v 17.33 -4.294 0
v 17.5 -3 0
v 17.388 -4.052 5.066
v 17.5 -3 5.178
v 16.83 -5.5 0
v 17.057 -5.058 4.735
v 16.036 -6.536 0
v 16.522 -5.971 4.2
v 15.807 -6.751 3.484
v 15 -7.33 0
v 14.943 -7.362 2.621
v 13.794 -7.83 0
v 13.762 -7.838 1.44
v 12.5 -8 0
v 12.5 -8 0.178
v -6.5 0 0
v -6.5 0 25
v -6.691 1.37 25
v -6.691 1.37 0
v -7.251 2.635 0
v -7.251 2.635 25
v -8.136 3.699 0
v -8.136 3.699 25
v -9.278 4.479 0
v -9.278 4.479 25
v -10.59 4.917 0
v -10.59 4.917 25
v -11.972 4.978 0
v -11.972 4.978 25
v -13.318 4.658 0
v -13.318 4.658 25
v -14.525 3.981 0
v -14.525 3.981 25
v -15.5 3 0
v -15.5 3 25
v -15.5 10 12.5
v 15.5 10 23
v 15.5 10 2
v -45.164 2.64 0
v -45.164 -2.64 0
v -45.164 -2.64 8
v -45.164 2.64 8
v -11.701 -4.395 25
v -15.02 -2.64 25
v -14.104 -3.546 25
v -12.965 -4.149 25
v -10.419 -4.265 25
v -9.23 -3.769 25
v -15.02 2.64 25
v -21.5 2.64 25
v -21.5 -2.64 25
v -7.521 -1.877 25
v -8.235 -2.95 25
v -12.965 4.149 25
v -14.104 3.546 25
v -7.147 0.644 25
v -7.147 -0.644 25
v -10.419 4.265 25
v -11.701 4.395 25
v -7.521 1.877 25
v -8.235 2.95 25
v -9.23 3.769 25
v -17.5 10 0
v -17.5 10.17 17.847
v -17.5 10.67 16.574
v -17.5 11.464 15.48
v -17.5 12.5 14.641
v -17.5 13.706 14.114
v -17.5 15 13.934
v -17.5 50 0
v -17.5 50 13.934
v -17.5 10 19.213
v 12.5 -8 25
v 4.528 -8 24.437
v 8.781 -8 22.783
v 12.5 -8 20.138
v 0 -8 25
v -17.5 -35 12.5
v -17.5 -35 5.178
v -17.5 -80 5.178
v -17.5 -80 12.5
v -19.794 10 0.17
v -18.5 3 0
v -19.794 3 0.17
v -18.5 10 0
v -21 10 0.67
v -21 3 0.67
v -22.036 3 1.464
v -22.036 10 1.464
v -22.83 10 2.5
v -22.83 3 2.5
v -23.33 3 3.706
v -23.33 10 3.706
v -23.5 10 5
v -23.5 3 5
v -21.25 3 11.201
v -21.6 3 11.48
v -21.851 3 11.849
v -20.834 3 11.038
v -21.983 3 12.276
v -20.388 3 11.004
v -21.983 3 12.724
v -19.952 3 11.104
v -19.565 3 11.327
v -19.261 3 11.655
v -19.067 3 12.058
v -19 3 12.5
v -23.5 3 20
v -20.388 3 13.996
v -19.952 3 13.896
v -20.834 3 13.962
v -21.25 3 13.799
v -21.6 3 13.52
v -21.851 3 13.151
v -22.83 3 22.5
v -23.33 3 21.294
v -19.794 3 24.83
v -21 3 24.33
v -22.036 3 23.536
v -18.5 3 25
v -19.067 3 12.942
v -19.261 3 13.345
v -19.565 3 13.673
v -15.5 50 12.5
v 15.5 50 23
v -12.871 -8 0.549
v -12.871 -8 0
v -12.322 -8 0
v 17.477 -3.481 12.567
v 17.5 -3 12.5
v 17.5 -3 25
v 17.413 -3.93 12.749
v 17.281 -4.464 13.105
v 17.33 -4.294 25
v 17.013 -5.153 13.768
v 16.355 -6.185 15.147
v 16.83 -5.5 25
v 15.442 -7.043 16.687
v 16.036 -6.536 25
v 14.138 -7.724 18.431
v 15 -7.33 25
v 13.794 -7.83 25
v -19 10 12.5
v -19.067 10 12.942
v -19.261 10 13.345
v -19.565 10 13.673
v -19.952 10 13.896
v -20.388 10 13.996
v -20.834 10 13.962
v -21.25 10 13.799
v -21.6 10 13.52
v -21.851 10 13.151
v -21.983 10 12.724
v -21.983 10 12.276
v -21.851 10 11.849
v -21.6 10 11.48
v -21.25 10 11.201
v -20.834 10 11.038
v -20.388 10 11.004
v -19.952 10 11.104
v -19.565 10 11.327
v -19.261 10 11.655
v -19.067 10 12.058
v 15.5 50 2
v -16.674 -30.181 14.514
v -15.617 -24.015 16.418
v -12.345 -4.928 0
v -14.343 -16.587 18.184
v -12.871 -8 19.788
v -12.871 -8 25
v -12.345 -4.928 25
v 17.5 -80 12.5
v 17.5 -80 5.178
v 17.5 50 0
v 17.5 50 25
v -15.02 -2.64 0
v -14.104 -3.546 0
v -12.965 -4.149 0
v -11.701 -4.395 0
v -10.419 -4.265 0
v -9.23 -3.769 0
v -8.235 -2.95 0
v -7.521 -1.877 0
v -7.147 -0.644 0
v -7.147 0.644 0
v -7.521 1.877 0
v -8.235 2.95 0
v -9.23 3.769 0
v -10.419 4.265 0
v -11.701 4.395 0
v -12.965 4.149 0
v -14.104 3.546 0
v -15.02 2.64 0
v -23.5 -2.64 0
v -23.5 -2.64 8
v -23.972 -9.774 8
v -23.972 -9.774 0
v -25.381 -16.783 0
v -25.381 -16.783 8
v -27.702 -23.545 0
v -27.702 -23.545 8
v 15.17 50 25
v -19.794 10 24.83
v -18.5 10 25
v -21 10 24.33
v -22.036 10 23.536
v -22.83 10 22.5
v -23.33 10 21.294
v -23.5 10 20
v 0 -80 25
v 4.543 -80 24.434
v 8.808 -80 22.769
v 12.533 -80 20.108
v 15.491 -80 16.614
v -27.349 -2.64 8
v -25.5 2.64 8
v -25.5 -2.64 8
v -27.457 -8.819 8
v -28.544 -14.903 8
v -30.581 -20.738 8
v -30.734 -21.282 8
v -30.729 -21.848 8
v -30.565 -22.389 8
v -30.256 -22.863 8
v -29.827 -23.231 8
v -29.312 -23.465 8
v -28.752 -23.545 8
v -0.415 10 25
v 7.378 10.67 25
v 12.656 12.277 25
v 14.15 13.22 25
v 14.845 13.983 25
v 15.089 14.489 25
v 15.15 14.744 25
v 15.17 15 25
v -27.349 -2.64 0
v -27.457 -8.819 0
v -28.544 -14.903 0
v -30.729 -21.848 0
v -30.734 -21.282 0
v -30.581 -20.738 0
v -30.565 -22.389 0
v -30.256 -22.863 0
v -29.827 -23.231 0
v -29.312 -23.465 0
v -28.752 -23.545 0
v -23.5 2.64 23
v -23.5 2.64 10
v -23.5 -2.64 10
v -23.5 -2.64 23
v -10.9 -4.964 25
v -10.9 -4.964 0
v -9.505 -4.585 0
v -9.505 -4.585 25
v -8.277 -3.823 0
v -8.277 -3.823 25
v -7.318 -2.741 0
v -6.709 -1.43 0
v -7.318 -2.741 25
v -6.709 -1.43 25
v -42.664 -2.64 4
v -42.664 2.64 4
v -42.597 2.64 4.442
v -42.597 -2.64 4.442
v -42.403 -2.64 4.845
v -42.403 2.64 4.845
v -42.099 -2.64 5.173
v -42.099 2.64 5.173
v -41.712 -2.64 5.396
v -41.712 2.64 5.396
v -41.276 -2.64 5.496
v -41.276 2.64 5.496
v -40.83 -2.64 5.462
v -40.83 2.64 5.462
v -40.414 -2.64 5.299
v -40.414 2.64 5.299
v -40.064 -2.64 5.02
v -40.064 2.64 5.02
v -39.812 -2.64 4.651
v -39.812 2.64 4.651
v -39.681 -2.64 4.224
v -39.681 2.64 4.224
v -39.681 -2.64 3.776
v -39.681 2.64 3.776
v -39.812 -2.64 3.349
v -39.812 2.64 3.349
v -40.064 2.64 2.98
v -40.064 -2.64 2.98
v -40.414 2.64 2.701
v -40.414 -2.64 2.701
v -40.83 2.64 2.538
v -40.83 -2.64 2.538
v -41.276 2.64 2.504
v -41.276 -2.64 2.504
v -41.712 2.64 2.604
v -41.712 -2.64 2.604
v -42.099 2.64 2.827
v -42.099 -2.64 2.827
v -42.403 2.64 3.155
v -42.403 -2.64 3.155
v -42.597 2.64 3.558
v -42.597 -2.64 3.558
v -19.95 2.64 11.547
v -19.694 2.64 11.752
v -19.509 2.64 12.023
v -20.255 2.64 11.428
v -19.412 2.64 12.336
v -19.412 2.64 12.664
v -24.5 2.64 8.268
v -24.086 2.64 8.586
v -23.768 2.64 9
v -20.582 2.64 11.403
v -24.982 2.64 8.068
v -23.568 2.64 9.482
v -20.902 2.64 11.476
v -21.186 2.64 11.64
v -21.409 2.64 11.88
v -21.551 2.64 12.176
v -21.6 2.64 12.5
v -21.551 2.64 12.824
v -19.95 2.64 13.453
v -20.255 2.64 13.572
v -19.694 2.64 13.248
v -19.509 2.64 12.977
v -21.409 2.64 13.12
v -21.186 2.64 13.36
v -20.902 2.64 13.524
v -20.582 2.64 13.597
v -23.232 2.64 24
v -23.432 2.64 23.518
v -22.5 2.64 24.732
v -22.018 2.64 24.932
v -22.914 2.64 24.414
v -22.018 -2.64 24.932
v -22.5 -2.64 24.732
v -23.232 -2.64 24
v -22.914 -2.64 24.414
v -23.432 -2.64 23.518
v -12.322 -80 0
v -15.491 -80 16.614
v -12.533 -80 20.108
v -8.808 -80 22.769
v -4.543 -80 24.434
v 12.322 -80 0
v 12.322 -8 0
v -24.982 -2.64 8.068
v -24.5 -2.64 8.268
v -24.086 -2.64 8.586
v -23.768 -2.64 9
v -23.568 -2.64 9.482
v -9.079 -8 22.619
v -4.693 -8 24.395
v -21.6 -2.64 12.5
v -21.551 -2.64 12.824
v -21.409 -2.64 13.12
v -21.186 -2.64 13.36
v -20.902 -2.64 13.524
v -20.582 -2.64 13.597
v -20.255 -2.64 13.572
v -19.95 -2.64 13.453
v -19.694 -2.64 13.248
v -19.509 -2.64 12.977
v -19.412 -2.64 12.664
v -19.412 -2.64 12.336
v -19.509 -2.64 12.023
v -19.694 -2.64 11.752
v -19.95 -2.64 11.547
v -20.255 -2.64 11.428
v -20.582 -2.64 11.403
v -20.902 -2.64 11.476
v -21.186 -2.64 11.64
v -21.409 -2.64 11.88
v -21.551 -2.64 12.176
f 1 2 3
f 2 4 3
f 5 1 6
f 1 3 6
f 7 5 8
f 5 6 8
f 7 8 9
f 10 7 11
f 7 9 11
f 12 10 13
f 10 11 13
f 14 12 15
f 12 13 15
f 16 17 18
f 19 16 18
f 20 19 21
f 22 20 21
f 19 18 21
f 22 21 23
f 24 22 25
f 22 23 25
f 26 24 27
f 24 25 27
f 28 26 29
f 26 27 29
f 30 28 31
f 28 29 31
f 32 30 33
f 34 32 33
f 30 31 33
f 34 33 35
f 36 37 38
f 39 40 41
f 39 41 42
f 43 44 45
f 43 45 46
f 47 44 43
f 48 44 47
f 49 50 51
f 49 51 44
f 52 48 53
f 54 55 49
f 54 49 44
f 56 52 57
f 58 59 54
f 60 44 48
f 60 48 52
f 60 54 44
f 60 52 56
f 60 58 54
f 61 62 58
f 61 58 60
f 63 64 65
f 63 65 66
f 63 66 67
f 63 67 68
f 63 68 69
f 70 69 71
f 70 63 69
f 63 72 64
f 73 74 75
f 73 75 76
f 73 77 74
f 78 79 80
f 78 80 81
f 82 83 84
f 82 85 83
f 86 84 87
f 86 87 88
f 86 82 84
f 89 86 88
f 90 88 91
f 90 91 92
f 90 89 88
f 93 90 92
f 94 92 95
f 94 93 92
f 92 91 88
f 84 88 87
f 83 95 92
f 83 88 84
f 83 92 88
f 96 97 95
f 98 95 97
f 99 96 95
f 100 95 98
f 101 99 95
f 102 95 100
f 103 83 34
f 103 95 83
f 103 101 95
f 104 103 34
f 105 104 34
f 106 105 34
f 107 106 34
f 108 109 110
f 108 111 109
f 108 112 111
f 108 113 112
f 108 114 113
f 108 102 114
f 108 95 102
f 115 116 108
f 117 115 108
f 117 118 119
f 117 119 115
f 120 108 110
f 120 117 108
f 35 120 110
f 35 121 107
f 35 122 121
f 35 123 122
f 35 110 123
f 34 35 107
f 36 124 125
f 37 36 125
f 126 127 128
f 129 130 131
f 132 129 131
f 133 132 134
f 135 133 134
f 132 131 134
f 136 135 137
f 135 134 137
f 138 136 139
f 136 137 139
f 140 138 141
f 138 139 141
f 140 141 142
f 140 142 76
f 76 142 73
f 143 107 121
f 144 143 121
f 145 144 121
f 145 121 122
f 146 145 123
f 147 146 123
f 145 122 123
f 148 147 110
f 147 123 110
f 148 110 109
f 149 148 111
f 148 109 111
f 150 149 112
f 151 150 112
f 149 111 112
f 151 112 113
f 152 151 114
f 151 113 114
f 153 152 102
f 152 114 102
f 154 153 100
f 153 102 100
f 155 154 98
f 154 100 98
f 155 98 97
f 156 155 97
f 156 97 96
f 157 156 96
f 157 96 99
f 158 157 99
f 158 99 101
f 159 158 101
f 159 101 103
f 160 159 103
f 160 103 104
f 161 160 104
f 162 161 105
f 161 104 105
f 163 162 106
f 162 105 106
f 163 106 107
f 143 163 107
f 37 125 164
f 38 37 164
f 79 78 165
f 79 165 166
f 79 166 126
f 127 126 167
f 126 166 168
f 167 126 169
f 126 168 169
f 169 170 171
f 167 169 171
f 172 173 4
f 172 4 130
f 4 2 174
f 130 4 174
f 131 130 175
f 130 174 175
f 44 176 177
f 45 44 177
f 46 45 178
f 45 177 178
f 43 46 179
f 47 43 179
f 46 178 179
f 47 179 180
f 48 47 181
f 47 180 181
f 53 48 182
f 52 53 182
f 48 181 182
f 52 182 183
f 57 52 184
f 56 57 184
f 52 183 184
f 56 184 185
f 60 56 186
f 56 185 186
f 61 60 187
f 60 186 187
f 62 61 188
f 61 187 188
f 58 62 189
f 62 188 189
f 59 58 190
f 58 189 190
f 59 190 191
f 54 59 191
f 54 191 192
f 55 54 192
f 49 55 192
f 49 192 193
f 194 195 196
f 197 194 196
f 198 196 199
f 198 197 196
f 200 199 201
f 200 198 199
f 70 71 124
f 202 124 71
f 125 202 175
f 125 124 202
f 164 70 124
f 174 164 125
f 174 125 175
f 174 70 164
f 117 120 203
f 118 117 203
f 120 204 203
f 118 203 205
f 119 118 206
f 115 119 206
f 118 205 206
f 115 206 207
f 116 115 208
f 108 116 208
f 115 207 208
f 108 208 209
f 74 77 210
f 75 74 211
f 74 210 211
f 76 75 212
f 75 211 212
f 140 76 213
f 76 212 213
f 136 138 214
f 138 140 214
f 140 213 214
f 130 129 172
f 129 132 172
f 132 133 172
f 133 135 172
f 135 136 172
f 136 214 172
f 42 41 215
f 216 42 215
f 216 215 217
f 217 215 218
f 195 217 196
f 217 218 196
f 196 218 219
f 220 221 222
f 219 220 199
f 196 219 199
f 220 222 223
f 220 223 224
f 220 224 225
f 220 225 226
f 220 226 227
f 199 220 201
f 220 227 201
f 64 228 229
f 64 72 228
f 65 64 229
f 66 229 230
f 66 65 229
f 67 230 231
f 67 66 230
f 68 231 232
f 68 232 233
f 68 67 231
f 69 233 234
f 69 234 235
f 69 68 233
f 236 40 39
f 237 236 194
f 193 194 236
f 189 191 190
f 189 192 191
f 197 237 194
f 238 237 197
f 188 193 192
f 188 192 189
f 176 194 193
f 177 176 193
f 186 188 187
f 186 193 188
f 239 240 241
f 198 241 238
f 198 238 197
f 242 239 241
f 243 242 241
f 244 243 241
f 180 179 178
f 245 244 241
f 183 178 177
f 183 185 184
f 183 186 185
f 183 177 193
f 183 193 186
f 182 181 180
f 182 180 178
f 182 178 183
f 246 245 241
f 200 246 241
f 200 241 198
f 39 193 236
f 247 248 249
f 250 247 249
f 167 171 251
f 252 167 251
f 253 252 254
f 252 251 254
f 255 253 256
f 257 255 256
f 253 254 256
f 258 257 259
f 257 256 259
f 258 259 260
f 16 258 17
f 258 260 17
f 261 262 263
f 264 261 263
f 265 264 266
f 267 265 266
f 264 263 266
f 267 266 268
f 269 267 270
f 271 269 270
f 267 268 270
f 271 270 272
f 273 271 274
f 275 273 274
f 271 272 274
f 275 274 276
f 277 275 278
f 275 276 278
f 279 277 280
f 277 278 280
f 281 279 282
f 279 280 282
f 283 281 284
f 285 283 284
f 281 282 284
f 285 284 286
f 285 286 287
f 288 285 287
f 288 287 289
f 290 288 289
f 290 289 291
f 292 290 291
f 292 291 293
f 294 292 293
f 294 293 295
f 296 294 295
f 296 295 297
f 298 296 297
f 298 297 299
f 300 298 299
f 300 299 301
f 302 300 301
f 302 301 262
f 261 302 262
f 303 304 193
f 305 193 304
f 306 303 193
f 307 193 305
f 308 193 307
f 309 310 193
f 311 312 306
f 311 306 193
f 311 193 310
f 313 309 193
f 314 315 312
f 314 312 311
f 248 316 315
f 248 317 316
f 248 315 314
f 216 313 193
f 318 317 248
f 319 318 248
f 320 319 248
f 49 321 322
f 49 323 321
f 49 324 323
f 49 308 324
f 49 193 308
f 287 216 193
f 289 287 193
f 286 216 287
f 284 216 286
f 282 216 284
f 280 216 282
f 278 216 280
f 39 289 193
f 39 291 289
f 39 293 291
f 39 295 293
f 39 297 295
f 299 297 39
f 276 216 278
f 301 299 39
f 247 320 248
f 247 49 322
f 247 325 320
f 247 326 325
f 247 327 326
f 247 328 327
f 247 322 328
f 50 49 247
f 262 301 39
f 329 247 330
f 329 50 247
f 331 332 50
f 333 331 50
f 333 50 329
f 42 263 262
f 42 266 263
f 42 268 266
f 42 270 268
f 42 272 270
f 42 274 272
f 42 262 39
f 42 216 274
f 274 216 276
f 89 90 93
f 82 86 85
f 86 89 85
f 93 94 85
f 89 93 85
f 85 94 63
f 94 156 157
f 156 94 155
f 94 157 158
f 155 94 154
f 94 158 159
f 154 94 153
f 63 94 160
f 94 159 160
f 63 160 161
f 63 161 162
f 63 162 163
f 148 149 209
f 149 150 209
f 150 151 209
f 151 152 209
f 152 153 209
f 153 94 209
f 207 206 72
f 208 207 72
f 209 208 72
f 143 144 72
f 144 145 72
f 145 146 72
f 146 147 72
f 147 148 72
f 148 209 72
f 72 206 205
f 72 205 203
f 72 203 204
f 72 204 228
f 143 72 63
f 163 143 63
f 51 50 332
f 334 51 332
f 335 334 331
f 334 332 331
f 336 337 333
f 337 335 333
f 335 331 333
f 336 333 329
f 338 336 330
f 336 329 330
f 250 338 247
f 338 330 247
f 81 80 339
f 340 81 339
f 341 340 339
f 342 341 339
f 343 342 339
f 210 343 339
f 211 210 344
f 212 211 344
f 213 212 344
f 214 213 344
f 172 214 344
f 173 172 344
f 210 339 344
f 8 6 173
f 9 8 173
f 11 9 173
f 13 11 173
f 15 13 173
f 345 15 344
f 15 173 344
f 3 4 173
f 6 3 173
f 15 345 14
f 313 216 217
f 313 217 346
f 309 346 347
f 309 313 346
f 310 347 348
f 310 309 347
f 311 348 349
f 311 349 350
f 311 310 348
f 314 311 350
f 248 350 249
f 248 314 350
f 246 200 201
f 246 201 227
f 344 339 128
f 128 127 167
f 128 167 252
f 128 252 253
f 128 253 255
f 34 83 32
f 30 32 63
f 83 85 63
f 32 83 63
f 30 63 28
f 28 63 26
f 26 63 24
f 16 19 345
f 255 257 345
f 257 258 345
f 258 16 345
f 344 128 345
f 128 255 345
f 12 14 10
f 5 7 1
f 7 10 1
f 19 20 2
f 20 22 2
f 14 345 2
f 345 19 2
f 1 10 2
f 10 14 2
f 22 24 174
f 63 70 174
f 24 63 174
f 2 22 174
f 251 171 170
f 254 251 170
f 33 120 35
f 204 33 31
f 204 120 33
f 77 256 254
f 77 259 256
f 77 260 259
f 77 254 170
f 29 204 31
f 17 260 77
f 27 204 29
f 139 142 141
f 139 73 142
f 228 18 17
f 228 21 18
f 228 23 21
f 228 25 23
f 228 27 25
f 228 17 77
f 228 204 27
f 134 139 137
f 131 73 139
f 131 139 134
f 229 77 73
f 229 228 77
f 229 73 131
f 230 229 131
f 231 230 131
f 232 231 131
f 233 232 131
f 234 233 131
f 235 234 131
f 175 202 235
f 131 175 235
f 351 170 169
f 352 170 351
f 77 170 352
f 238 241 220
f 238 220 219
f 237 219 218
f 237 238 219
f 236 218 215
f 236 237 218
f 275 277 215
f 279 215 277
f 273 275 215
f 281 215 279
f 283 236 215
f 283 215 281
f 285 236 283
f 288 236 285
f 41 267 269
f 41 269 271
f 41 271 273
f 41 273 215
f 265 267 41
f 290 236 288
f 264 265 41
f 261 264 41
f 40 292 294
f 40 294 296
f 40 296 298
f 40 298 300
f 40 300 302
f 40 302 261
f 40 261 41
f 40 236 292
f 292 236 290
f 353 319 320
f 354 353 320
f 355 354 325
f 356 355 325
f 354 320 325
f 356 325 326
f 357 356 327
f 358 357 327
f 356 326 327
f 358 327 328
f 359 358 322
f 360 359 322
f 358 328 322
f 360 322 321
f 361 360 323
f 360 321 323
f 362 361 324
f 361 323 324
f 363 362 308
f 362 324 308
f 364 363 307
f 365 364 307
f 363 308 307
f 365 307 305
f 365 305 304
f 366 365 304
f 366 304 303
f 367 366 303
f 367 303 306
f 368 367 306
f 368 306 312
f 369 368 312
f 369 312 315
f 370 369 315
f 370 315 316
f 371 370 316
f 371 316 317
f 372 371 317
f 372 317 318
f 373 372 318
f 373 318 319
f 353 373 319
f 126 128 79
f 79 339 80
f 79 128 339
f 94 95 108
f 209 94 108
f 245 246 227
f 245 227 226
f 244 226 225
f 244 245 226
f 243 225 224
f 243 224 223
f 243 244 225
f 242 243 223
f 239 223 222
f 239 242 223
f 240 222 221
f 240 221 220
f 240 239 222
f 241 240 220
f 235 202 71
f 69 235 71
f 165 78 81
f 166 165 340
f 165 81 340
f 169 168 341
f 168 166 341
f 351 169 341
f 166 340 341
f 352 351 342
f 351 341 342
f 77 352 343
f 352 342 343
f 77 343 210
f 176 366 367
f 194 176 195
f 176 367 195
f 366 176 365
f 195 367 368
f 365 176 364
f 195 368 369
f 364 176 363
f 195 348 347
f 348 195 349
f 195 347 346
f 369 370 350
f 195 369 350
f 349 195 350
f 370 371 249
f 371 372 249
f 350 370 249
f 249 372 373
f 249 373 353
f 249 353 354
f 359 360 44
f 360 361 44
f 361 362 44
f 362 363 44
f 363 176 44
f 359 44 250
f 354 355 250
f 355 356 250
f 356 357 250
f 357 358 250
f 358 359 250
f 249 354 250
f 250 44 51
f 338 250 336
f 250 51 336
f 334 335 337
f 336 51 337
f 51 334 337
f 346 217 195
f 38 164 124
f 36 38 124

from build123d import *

# Parameters (mm, degrees)
F0_W         = 35
F0_H         = 100
F1_DEPTH     = 25
F3_DEPTH     = 40
F5_DEPTH     = 25.001
F6_W         = 6
F6_H         = 25
F6_R         = 1.5
F7_DEPTH     = 7
F9_DEPTH     = 25
F10_R        = 1.0999994278
F11_DEPTH    = 52.641
F13_DEPTH    = 8
F14_T1_DEPTH = 5.28
F14_T3_DEPTH = 24.0296074828
F14_T5_DEPTH = 15.28
F15_DEPTH    = 30
F17_DEPTH    = 72
F18_R        = 5
F19_R        = 1.5
F20_DEPTH    = 82.6410001


# Not quite as in the source:
# - a fillet or chamfer that OpenCascade refuses, or shapes differently, is made with other operations: its cross-section is extruded or revolved along the edge and cut away or added


with BuildPart() as f1:
    # F0 (on Top) → F1 (new body)
    with BuildSketch(Plane.XY):
        Rectangle(F0_W, F0_H)
    extrude(amount=F1_DEPTH)

    # F2 (on face) → F3 (cut)
    with BuildSketch(Plane(origin=(0, 50, 0), x_dir=(-1, 0, 0), z_dir=(0, 1, 0))):
        Polygon((15.5, 12.5), (-15.5, 23), (-15.5, 2), align=None)
        Polygon((17.5, 25), (-15.1704846289, 25), (17.5, 13.9341906902), align=None)
    extrude(amount=-F3_DEPTH, mode=Mode.SUBTRACT)

    # F4 (on face) → F5 (cut, through all)
    with BuildSketch(Plane.XY.offset(25)):
        with BuildLine():
            ThreePointArc((-12.3448190756, -4.9281112741), (-8.2769653568, -3.822570822), (-6.5, 0))
            ThreePointArc((-6.5, 0), (-9.9188611699, 4.7434164903), (-15.5, 3))
            Line((-15.5, 3), (-15.5, -3))
            ThreePointArc((-15.5, -3), (-14.1071960494, -4.2664421665), (-12.3448190756, -4.9281112741))
        make_face()
        with BuildLine():
            Line((-15.5, -3), (-15.5, 3))
            ThreePointArc((-15.5, 3), (-16.5, 0), (-15.5, -3))
        make_face()
        with BuildLine():
            ThreePointArc((-15.5, -3), (-16.5, 0), (-15.5, 3))
            Line((-15.5, 3), (-19.5, 3))
            Line((-19.5, 3), (-19.5, -3))
            Line((-19.5, -3), (-17.5, -3))
            Line((-17.5, -3), (-15.5, -3))
        make_face()
        with BuildLine():
            Line((-17.5, -35), (-12.3448190756, -4.9281112741))
            ThreePointArc((-12.3448190756, -4.9281112741), (-14.1071960494, -4.2664421665), (-15.5, -3))
            Line((-15.5, -3), (-17.5, -3))
            Line((-17.5, -3), (-17.5, -35))
        make_face()
    extrude(amount=-F5_DEPTH, mode=Mode.SUBTRACT)

    # F6 (on face) → F7 (join, through all)
    with BuildSketch(Plane.XZ.offset(-3)):
        with Locations((-20.5, 12.5)):
            Rectangle(F6_W, F6_H)
        with Locations((-20.5, 12.5)):
            Circle(F6_R, mode=Mode.SUBTRACT)
    extrude(amount=-F7_DEPTH)

    # F15 (add): a face of the model
    f15_faces = [f1.faces().sort_by_distance(p)[0] for p in [
        (0, -50, 12.5),
    ]]
    extrude(f15_faces, amount=F15_DEPTH)

    # F16 (on face) → F17 (cut)
    with BuildSketch(Plane.XZ.offset(80)):
        with BuildLine():
            ThreePointArc((0, 25), (10.7529065838, 21.5540692173), (17.5, 12.5))
            Line((17.5, 12.5), (17.5, 25))
            Line((17.5, 25), (0, 25))
        make_face()
        with BuildLine():
            ThreePointArc((-17.5, 12.5), (-10.7529065838, 21.5540692173), (0, 25))
            Line((0, 25), (-17.5, 25))
            Line((-17.5, 25), (-17.5, 12.5))
        make_face()
        Polygon((-12.3223304703, 0), (-17.5, 5.1776695297), (-17.5, 0), align=None)
        Polygon((17.5, 0), (17.5, 5.1776695297), (12.3223304703, 0), align=None)
    extrude(amount=-F17_DEPTH, mode=Mode.SUBTRACT)

    # F18
    f18_edges = [f1.edges().sort_by_distance(p)[0] for p in [
        (17.5, -8, 18.75),
        (17.5, -8, 2.588835),
        (-1.164758, 10, 19.467095),
        (-23.5, 6.5, 0),
        (-23.5, 6.5, 25),
    ]]
    fillet(f18_edges, radius=F18_R)


with BuildPart() as f9:
    # F8 (on Top) → F9 (new body, through all)
    with BuildSketch(Plane.XY):
        with BuildLine():
            Line((-23.5, -2.64), (-15.02, -2.64))
            ThreePointArc((-15.02, -2.64), (-7.1, 0), (-15.02, 2.64))
            Line((-15.02, 2.64), (-23.5, 2.64))
            Line((-23.5, 2.64), (-23.5, -2.64))
        make_face()
    extrude(amount=F9_DEPTH)

    # F10 (on face) → F11 (cut, through all)
    with BuildSketch(Plane(origin=(0, 2.64, 0), x_dir=(-1, 0, 0), z_dir=(0, 1, 0))):
        with Locations((20.5, 12.5)):
            Circle(F10_R)
    extrude(amount=-F11_DEPTH, mode=Mode.SUBTRACT)

    # F12 (on face) → F13 (join)
    with BuildSketch(Plane(origin=(0, 0, 0), x_dir=(1, 0, 0), z_dir=(0, 0, -1))):
        with BuildLine():
            ThreePointArc((-23.5, 2.64), (-24.5610181297, 13.3015957041), (-27.7024523358, 23.5449727625))
            Line((-27.7024523358, 23.5449727625), (-31.957603991, 23.5449727625))
            ThreePointArc((-31.957603991, 23.5449727625), (-28.1854810092, 13.4160571698), (-27.3485612124, 2.64))
            Line((-27.3485612124, 2.64), (-45.1639331877, 2.64))
            Line((-45.1639331877, 2.64), (-45.1639331877, -2.64))
            Line((-45.1639331877, -2.64), (-23.5, -2.64))
            Line((-23.5, -2.64), (-23.5, 2.64))
        make_face()
    extrude(amount=-F13_DEPTH)

    # F14: fillet of radius 2 on 3 edges, made by hand

    # F14_s2 → F14_t1 (join)
    with BuildSketch(Plane.XZ.offset(-2.64)):
        with BuildLine():
            ThreePointArc((-25.5, 8), (-24.0857864376, 8.5857864376), (-23.5, 10))
            Line((-23.5, 10), (-23.5, 8))
            Line((-23.5, 8), (-25.5, 8))
        make_face()
    extrude(amount=F14_T1_DEPTH)

    # F14_s4 → F14_t3 (cut)
    with BuildSketch(Plane.XY.offset(-8.0148037414)):
        with BuildLine():
            ThreePointArc((-28.7516824945, -23.5449727625), (-30.4271988015, -22.6370556829), (-30.5814852362, -20.7376178675))
            ThreePointArc((-30.5814852362, -20.7376178675), (-31.2413053207, -22.1551377475), (-31.957603991, -23.5449727625))
            Line((-31.957603991, -23.5449727625), (-28.7516824945, -23.5449727625))
        make_face()
    extrude(amount=F14_T3_DEPTH, mode=Mode.SUBTRACT)

    # F14_s6 → F14_t5 (cut)
    with BuildSketch(Plane.XZ.offset(-7.64)):
        with BuildLine():
            ThreePointArc((-21.5, 25), (-22.9142135624, 24.4142135624), (-23.5, 23))
            Line((-23.5, 23), (-23.5, 25))
            Line((-23.5, 25), (-21.5, 25))
        make_face()
    extrude(amount=F14_T5_DEPTH, mode=Mode.SUBTRACT)

    # F19 (on face) → F20 (cut, through all)
    with BuildSketch(Plane(origin=(0, 2.64, 0), x_dir=(-1, 0, 0), z_dir=(0, 1, 0))):
        with Locations((41.1639331877, 4)):
            Circle(F19_R)
    extrude(amount=-F20_DEPTH, mode=Mode.SUBTRACT)


solid = Compound([f1.part, f9.part])
